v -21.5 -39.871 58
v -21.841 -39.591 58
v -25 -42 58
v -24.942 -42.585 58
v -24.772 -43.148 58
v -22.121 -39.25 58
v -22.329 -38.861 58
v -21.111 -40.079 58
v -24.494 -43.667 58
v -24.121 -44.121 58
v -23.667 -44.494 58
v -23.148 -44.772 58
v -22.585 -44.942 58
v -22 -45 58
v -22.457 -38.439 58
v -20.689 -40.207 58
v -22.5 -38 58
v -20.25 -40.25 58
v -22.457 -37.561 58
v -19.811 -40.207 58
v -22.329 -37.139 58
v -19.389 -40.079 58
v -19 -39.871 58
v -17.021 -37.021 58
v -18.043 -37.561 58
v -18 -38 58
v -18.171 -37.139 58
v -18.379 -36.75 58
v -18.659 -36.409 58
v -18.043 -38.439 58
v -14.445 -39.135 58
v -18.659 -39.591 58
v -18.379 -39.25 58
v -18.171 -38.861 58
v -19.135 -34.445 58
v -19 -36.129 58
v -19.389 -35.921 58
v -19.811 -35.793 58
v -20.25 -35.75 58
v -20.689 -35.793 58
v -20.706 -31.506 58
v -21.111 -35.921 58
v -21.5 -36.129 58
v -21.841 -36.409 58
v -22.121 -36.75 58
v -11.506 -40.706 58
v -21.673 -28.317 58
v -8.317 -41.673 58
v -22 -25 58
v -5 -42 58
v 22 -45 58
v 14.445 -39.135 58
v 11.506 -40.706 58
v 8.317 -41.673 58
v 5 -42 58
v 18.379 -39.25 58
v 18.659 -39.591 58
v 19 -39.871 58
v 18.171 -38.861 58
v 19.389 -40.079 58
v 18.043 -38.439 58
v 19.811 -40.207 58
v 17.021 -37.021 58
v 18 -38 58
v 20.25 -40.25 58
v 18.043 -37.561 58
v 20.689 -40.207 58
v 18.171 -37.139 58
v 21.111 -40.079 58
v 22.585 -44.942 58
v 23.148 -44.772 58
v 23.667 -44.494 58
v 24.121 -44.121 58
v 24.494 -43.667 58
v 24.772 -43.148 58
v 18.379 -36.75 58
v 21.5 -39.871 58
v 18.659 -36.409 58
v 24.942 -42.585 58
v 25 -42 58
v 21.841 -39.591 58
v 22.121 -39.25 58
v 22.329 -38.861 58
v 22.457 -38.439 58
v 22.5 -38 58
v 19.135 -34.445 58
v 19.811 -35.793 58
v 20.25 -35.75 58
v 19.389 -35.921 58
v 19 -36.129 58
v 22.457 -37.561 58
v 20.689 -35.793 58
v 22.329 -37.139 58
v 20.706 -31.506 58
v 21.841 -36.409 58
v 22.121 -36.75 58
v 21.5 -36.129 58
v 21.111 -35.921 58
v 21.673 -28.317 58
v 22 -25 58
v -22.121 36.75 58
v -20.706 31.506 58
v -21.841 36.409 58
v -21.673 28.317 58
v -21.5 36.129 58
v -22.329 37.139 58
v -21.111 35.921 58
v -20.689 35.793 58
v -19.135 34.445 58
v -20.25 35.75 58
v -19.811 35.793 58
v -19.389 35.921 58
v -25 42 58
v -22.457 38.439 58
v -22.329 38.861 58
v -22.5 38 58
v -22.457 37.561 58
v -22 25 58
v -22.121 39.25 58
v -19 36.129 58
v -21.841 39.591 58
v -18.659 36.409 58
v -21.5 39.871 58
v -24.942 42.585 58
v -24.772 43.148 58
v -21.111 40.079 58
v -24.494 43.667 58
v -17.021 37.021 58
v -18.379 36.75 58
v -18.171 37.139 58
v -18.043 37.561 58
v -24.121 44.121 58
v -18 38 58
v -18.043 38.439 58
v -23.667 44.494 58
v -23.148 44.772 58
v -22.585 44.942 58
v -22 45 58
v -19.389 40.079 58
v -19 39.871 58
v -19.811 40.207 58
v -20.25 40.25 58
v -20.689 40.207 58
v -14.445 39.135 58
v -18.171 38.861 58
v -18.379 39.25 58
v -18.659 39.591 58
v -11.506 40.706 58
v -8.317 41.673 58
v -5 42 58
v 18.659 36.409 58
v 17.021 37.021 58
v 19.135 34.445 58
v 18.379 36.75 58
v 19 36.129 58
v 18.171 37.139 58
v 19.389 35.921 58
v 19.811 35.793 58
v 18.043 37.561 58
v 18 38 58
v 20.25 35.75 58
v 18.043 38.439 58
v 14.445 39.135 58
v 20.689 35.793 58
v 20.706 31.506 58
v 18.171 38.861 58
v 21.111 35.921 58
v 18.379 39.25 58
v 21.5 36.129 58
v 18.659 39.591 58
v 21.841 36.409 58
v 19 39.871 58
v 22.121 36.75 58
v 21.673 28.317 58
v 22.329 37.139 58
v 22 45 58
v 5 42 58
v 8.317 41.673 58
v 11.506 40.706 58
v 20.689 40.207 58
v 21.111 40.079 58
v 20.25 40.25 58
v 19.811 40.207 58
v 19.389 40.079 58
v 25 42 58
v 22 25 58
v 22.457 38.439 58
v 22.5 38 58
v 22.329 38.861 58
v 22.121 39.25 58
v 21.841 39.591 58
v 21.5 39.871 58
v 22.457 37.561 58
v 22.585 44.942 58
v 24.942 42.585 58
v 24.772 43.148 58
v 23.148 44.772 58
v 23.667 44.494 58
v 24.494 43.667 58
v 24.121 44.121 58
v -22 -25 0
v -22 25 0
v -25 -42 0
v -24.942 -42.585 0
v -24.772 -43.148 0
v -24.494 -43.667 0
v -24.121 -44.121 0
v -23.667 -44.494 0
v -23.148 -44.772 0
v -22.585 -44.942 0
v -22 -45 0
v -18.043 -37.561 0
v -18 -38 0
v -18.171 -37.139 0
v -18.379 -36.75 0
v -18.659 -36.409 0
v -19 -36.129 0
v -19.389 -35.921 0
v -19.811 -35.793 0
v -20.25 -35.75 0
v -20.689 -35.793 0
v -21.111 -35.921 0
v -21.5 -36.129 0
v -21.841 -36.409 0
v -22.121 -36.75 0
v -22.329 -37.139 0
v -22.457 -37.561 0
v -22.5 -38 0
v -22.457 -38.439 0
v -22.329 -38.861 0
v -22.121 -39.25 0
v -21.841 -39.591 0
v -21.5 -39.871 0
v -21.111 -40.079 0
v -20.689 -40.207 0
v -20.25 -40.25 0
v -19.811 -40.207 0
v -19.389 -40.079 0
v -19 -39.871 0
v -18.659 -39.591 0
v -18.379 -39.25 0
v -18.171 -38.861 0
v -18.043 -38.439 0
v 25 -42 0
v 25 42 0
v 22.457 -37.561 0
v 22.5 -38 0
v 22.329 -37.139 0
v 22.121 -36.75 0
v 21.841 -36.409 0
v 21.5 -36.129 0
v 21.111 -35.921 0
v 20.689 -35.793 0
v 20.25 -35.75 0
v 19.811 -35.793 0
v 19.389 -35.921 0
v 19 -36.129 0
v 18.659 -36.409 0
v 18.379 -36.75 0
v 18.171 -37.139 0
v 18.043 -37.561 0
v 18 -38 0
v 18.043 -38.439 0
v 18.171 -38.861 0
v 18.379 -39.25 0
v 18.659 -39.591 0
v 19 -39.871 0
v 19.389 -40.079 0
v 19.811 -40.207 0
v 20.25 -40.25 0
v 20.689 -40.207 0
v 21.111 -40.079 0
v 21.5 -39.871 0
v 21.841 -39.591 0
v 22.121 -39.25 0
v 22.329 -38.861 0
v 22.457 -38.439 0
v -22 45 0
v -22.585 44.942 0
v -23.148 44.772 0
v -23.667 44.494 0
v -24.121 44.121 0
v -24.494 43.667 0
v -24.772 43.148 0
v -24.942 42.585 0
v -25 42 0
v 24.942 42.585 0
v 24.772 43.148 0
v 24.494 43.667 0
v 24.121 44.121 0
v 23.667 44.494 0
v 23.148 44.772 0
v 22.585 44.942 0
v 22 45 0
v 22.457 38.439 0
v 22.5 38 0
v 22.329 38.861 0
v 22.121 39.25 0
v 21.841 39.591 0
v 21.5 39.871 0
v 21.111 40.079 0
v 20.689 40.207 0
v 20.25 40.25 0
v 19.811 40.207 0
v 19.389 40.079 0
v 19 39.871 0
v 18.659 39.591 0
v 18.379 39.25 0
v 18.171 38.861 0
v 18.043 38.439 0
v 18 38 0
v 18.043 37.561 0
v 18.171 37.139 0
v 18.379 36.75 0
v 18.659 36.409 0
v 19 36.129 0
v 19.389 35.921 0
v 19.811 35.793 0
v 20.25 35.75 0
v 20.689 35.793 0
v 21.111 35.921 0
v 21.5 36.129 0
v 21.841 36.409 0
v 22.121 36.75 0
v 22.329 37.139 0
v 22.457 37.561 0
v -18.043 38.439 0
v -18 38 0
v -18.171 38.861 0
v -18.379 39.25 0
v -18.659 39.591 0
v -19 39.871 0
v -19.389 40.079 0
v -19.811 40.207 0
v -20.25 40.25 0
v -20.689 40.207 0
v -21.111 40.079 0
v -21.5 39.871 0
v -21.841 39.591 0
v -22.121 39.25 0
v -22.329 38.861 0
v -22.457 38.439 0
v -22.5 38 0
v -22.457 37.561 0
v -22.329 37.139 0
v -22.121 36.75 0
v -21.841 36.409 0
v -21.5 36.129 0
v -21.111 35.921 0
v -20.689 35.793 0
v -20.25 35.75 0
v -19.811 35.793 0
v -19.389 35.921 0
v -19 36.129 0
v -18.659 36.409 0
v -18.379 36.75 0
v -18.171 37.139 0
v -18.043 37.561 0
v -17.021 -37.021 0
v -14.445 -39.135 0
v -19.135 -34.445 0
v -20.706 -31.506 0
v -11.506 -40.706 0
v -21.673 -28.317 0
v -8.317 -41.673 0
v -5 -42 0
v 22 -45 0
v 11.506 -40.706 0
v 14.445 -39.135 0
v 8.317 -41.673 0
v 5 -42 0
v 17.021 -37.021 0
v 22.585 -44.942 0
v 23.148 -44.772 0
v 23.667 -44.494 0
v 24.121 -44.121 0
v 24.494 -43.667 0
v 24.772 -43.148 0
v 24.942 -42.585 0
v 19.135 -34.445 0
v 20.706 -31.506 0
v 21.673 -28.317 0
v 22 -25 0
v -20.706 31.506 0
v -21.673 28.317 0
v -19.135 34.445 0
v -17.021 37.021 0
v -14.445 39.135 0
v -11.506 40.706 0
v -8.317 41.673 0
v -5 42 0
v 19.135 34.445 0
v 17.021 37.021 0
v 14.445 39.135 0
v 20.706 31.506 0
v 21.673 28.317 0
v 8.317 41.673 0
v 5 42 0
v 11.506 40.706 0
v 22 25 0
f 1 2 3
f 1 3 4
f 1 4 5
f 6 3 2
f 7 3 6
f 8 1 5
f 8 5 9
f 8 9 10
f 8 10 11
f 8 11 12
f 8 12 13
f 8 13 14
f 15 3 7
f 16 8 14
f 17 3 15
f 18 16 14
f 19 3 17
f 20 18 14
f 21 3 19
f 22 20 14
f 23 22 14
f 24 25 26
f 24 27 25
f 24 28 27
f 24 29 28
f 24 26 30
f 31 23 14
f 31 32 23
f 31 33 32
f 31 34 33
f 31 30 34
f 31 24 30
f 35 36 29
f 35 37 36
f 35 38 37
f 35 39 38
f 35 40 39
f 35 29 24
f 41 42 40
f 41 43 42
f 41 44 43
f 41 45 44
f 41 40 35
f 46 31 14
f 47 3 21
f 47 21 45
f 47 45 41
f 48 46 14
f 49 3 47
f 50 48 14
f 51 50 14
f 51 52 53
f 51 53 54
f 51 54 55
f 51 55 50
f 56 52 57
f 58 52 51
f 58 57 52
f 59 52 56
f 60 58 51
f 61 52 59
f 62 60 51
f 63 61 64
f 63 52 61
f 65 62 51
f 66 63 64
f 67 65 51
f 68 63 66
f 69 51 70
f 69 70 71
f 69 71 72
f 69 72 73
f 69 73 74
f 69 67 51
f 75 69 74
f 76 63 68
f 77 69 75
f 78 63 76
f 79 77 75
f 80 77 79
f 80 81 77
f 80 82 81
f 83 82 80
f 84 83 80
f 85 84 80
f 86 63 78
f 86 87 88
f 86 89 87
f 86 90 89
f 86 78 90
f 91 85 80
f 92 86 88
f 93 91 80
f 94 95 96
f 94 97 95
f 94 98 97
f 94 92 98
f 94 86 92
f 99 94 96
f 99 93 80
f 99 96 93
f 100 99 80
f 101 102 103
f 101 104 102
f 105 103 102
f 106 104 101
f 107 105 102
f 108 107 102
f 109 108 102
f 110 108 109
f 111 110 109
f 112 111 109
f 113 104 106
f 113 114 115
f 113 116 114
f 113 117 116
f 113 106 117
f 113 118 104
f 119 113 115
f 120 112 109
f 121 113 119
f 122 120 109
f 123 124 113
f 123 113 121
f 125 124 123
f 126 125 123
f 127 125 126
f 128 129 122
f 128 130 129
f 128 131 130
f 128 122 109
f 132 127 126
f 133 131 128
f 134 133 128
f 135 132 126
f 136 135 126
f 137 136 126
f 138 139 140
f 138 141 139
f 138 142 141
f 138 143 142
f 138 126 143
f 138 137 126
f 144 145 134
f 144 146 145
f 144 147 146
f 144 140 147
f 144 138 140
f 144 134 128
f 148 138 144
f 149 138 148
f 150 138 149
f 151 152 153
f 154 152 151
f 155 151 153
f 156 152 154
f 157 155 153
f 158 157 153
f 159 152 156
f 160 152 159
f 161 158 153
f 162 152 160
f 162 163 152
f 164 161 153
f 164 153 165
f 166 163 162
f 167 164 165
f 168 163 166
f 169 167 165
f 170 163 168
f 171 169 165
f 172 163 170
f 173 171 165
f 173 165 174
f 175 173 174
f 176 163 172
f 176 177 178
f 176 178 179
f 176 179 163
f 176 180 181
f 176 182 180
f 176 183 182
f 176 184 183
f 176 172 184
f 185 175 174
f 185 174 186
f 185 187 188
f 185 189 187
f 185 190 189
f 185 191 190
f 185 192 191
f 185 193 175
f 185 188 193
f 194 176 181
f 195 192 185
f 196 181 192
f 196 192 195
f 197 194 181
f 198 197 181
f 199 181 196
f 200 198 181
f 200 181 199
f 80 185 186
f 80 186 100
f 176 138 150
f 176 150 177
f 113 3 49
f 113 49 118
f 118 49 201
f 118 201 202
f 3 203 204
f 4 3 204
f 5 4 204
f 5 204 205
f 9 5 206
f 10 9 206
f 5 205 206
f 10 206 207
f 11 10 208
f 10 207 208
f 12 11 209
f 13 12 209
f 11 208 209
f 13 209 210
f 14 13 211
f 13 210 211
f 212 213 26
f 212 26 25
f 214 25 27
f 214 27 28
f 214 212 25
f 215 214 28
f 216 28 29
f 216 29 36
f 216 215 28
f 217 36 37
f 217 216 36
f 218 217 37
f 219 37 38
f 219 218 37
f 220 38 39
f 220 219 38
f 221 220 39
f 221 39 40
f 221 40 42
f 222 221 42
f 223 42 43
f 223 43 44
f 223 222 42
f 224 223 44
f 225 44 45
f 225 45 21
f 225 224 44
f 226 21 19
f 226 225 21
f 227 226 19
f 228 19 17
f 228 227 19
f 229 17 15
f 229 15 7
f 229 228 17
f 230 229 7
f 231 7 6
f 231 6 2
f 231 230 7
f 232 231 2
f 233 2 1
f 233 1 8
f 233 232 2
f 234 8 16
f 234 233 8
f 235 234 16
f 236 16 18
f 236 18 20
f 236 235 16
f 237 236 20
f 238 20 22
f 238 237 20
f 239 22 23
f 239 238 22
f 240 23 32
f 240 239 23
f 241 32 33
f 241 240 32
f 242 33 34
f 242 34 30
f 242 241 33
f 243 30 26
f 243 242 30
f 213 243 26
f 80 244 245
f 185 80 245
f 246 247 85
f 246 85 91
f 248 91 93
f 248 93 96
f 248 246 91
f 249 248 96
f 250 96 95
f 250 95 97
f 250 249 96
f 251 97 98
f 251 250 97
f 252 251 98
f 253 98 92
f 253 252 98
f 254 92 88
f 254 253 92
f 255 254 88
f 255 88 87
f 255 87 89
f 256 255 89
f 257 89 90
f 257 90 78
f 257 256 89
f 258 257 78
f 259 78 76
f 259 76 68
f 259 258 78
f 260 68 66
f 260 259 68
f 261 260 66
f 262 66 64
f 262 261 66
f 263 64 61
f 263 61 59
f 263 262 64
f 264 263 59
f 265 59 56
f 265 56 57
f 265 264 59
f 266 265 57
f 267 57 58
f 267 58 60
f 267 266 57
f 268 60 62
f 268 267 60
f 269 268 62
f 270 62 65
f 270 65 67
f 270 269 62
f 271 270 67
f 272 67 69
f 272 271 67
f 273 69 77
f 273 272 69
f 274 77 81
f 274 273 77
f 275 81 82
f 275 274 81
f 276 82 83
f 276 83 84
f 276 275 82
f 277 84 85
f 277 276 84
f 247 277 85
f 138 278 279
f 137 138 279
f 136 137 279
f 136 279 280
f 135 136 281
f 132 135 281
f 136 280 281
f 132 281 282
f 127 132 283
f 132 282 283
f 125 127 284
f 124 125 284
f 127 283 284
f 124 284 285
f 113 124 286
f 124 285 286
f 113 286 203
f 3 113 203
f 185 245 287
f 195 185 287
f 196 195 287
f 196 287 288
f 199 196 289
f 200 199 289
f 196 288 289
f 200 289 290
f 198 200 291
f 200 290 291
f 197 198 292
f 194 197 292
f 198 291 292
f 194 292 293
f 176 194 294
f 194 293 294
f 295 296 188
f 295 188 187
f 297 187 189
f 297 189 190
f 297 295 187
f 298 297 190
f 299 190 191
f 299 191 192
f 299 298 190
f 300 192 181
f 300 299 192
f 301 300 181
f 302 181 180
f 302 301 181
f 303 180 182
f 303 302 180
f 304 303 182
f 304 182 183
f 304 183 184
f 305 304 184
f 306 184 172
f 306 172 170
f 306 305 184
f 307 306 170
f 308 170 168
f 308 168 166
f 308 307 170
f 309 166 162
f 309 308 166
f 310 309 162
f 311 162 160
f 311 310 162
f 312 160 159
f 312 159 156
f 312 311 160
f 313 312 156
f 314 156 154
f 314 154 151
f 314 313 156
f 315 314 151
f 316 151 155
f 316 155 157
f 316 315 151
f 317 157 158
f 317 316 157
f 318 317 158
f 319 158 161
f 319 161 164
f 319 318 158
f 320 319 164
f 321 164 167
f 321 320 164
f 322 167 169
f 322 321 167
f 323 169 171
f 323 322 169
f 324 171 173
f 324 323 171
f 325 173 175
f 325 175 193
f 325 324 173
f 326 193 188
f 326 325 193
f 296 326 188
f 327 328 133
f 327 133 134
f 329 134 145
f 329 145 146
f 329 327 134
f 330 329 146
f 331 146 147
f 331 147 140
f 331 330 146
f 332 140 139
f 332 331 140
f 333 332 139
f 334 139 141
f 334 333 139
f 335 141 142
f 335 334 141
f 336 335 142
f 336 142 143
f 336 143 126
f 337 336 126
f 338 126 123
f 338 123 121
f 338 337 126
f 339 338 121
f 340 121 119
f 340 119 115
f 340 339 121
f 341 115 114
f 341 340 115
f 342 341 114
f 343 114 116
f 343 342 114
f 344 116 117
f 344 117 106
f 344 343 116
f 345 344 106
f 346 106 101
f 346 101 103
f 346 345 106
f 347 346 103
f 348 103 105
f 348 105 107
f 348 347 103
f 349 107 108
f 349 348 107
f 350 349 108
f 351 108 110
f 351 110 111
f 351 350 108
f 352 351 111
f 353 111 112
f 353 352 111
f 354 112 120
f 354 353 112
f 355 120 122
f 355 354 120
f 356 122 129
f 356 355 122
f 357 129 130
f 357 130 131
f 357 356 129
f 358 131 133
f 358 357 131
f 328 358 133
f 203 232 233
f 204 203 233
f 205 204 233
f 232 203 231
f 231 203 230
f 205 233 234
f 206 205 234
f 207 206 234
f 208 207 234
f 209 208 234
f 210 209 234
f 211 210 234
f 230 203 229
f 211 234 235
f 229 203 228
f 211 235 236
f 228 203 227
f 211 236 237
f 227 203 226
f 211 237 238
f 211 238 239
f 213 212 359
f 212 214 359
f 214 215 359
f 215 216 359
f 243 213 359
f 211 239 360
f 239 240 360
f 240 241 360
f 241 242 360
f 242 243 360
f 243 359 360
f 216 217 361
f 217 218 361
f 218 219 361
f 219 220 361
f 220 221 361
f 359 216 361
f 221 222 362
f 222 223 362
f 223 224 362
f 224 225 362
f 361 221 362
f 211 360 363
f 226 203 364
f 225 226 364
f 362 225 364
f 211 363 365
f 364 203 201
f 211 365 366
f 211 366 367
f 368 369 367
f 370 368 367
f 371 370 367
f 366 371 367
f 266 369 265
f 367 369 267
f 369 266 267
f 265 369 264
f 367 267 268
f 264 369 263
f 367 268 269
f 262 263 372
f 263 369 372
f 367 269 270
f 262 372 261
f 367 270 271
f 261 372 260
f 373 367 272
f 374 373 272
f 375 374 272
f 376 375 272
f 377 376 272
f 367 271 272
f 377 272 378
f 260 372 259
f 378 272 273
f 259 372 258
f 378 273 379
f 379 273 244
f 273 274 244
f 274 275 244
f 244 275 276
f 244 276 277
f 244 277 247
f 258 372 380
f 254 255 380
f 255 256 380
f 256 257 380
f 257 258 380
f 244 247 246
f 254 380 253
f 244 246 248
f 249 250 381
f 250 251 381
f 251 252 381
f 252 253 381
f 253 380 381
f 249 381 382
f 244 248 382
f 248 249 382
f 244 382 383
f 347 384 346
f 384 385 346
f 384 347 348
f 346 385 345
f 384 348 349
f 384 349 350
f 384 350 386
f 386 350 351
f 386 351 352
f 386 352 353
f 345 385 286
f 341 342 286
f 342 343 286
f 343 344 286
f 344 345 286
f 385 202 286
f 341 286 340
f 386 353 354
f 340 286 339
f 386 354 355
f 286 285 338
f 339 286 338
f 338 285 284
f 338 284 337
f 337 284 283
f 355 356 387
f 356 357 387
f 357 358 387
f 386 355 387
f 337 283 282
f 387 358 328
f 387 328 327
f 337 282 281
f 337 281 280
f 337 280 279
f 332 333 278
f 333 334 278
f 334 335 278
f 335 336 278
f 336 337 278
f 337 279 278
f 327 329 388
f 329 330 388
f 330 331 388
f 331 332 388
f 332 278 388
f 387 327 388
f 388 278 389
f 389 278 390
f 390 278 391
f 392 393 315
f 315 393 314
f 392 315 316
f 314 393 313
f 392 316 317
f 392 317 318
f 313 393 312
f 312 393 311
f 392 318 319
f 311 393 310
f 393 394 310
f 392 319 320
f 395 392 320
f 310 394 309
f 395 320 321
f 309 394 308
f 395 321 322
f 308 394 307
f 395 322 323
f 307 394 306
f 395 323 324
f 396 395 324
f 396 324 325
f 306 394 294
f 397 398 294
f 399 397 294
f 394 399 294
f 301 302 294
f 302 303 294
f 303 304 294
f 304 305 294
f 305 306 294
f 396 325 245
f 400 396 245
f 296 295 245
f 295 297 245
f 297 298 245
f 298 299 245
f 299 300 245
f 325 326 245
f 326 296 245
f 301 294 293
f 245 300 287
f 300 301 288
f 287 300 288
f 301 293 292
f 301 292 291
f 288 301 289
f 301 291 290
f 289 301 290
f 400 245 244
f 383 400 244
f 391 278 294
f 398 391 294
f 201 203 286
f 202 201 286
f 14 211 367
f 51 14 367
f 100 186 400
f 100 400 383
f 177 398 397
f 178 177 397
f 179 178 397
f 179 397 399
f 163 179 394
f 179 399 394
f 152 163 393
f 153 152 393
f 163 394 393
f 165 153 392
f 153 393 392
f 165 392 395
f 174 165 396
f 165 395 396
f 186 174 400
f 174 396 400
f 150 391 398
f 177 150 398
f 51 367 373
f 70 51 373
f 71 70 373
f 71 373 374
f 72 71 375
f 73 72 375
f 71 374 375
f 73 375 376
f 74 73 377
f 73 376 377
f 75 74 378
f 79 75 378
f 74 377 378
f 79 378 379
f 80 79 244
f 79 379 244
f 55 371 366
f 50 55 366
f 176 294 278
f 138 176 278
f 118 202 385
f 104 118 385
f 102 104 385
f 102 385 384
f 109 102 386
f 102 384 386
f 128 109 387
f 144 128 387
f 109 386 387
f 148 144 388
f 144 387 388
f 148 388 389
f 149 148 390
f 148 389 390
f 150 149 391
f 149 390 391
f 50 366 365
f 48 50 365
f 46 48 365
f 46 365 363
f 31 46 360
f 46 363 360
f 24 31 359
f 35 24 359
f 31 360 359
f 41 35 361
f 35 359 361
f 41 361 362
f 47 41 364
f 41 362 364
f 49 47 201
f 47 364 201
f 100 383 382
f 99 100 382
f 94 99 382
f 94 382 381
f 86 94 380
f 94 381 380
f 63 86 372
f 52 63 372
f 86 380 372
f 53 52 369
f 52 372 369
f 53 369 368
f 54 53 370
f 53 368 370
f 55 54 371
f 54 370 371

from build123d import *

# Parameters (mm, degrees)
F0_R     = 2.25
F1_DEPTH = 58


with BuildPart() as f1:
    # F0 (on Top) → F1 (new body)
    with BuildSketch(Plane.XY):
        with BuildLine():
            Line((-22, -45), (22, -45))
            ThreePointArc((22, -45), (24.12132, -44.12132), (25, -42))
            Line((25, -42), (25, 42))
            ThreePointArc((25, 42), (24.12132, 44.12132), (22, 45))
            Line((22, 45), (-22, 45))
            ThreePointArc((-22, 45), (-24.12132, 44.12132), (-25, 42))
            Line((-25, 42), (-25, -42))
            ThreePointArc((-25, -42), (-24.12132, -44.12132), (-22, -45))
        make_face()
        with Locations((-20.25, -38)):
            Circle(F0_R, mode=Mode.SUBTRACT)
        with Locations((20.25, -38)):
            Circle(F0_R, mode=Mode.SUBTRACT)
        with Locations((-20.25, 38)):
            Circle(F0_R, mode=Mode.SUBTRACT)
        with BuildLine():
            ThreePointArc((22, -25), (17.020815, -37.020815), (5, -42))
            Line((5, -42), (-5, -42))
            ThreePointArc((-5, -42), (-17.020815, -37.020815), (-22, -25))
            Line((-22, -25), (-22, 25))
            ThreePointArc((-22, 25), (-17.020815, 37.020815), (-5, 42))
            Line((-5, 42), (5, 42))
            ThreePointArc((5, 42), (17.020815, 37.020815), (22, 25))
            Line((22, 25), (22, -25))
        make_face(mode=Mode.SUBTRACT)
        with Locations((20.25, 38)):
            Circle(F0_R, mode=Mode.SUBTRACT)
    extrude(amount=F1_DEPTH)


solid = f1.part
